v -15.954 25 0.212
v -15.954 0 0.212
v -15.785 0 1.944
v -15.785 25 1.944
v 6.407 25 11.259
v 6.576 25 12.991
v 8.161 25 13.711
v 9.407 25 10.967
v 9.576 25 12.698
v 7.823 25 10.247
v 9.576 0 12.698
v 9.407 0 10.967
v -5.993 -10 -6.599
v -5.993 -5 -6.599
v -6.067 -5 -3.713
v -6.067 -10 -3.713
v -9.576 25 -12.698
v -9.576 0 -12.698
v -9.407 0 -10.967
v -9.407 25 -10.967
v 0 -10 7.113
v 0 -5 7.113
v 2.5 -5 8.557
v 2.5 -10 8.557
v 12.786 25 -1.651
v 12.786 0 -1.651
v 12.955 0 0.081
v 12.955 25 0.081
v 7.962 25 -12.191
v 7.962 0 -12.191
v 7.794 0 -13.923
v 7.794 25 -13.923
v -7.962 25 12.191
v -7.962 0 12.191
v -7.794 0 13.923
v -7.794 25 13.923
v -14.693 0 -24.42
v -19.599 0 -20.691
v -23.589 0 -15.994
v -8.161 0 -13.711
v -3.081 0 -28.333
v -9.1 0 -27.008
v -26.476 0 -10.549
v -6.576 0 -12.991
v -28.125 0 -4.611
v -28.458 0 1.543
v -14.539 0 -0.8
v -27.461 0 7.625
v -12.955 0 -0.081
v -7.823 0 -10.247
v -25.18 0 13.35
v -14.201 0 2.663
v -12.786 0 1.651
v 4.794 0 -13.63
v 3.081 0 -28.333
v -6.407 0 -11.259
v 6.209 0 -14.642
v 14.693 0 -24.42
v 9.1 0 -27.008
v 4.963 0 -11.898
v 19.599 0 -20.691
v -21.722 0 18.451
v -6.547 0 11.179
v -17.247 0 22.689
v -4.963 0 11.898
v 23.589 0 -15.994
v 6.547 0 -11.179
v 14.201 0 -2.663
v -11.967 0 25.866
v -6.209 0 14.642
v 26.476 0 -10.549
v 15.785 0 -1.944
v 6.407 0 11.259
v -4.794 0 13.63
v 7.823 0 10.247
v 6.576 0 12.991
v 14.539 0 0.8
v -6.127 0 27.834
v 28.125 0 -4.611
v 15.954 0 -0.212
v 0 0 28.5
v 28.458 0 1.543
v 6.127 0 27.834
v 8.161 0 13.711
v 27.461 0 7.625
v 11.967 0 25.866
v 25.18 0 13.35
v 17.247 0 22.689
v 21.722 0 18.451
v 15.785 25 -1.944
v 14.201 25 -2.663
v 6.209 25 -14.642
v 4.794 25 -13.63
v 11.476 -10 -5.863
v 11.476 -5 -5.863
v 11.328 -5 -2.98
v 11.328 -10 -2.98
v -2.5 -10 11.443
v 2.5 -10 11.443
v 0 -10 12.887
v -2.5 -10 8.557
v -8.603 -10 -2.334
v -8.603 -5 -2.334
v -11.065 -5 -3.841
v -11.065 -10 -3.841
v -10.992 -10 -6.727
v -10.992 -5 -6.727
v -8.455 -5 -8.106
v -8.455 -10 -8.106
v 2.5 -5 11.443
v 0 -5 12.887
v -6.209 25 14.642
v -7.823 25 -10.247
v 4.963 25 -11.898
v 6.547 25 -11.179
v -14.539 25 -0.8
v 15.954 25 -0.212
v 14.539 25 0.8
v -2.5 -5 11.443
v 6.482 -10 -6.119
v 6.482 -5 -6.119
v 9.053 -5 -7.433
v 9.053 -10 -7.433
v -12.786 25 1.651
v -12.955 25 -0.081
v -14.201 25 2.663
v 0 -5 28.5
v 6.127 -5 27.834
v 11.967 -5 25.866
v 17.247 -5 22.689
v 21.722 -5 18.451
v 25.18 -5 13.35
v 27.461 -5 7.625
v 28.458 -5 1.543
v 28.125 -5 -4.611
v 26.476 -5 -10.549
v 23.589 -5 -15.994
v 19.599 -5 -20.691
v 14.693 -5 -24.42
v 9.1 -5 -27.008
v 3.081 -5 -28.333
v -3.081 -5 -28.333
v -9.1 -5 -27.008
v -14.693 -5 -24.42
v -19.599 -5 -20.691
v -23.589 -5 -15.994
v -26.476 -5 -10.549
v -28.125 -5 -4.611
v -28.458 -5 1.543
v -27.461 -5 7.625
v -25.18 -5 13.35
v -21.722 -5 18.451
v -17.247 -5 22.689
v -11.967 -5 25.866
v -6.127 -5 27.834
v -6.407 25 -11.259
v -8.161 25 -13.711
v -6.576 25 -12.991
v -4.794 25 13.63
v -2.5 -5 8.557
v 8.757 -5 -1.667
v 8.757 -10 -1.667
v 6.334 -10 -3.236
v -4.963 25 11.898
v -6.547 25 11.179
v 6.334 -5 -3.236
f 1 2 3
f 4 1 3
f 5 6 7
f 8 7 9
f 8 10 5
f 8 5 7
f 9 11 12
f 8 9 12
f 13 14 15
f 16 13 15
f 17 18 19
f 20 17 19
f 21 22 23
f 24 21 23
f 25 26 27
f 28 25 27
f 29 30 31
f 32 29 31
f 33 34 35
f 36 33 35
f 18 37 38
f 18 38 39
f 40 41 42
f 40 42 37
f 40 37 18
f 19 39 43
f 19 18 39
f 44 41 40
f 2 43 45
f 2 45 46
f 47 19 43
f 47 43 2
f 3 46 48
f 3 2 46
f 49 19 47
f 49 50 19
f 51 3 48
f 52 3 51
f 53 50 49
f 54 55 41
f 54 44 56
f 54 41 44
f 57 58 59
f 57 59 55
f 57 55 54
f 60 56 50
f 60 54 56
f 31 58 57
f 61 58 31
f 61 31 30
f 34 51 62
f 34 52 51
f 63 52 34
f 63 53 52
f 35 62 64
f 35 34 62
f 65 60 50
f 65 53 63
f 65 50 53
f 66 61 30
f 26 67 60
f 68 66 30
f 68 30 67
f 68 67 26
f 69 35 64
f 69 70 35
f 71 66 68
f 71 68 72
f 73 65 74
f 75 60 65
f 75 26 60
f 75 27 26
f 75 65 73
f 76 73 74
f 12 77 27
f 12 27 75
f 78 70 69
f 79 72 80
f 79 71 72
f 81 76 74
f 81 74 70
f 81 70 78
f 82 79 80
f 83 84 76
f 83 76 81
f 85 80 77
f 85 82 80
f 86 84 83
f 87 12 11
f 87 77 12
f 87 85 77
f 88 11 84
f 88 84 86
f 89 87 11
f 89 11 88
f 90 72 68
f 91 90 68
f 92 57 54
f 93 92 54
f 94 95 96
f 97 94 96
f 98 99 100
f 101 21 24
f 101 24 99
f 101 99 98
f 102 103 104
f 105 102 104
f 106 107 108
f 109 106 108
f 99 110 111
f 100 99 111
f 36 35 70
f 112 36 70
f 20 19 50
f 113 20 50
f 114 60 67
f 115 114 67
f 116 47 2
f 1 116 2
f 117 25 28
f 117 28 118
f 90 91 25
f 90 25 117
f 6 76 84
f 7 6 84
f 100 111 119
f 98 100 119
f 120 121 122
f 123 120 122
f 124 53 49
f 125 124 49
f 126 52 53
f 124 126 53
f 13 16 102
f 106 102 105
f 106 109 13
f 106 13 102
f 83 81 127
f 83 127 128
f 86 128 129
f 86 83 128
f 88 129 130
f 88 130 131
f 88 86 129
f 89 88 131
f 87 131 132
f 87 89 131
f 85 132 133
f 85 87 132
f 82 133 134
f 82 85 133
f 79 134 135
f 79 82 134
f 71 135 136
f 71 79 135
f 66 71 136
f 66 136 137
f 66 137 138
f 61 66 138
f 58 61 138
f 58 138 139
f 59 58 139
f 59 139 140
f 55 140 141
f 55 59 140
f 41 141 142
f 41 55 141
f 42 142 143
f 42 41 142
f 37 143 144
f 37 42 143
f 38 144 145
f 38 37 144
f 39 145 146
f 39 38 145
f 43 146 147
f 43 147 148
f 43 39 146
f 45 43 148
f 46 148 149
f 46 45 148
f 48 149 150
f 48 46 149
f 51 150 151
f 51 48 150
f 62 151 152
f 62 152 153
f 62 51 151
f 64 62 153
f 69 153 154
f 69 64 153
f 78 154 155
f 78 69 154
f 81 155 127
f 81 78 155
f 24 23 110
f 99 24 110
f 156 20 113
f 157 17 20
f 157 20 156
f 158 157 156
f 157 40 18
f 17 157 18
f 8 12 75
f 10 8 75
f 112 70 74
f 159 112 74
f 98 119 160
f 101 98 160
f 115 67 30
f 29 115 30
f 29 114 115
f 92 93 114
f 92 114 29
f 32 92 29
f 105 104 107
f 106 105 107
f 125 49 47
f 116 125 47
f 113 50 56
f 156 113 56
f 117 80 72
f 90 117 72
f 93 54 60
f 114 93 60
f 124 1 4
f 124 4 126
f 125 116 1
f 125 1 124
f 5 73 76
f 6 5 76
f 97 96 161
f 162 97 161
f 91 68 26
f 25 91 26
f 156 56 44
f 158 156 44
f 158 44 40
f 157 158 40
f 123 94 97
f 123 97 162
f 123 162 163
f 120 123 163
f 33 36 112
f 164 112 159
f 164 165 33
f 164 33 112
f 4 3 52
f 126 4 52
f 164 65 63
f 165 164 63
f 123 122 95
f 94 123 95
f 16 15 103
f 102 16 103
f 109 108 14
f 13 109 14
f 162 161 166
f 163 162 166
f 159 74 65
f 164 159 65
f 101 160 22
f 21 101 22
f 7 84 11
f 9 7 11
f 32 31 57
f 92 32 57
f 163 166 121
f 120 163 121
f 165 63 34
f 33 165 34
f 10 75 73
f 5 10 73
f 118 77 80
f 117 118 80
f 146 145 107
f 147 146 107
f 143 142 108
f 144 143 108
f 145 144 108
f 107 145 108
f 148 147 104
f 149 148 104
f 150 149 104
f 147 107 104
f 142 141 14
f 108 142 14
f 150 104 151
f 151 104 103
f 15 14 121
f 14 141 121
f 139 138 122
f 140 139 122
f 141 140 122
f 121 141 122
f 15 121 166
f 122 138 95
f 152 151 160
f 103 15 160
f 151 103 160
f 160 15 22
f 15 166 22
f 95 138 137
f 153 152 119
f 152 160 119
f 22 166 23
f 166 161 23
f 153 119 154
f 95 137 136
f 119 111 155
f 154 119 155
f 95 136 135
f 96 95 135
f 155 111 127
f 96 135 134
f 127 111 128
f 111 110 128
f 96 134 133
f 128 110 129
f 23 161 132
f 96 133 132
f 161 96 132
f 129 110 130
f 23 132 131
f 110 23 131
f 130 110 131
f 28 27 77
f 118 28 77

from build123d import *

# Parameters (mm, degrees)
EXTRUDE_1_DEPTH   = 25
EXTRUDE_1_2_DEPTH = 25
EXTRUDE_1_3_DEPTH = 25
EXTRUDE_1_4_DEPTH = 25
EXTRUDE_1_5_DEPTH = 25
EXTRUDE_1_6_DEPTH = 25
SKETCH_2_R        = 28.5
EXTRUDE_2_DEPTH   = 5
EXTRUDE_4_DEPTH   = 5


with BuildPart() as part:
    # 草图1 → 凸台-拉伸1 (new body)
    with BuildSketch(Plane(origin=(0, 0, 0), x_dir=(1, 0, 0), z_dir=(0, 1, 0))):
        Polygon((4.794019272, 13.629956631), (4.962963937, 11.898177863), (6.547200676, 11.178598851), (7.96249275, 12.190798607), (7.793548085, 13.922577374), (6.209311346, 14.642156386), align=None)
    extrude(amount=EXTRUDE_1_DEPTH)



with BuildPart() as body_2:
    # 草图1 → Extrude 1 2 (new body)
    with BuildSketch(Plane(origin=(0, 0, 0), x_dir=(1, 0, 0), z_dir=(0, 1, 0))):
        Polygon((15.954079735, 0.21187806), (15.78513507, 1.943656828), (14.200898331, 2.66323584), (12.785606257, 1.651036084), (12.954550922, -0.080742684), (14.538787661, -0.800321696), align=None)
    extrude(amount=EXTRUDE_1_2_DEPTH)


with BuildPart() as body_3:
    # 草图1 → Extrude 1 3 (new body)
    with BuildSketch(Plane(origin=(0, 0, 0), x_dir=(1, 0, 0), z_dir=(0, 1, 0))):
        Polygon((8.16053165, -13.710699314), (9.575823724, -12.698499559), (9.406879059, -10.966720791), (7.82264232, -10.247141779), (6.407350246, -11.259341535), (6.576294911, -12.991120302), align=None)
    extrude(amount=EXTRUDE_1_3_DEPTH)


with BuildPart() as body_4:
    # 草图1 → Extrude 1 4 (new body)
    with BuildSketch(Plane(origin=(0, 0, 0), x_dir=(1, 0, 0), z_dir=(0, 1, 0))):
        Polygon((-7.793548085, -13.922577374), (-6.209311346, -14.642156386), (-4.794019272, -13.629956631), (-4.962963937, -11.898177863), (-6.547200676, -11.178598851), (-7.96249275, -12.190798607), align=None)
    extrude(amount=EXTRUDE_1_4_DEPTH)


with BuildPart() as body_5:
    # 草图1 → Extrude 1 5 (new body)
    with BuildSketch(Plane(origin=(0, 0, 0), x_dir=(1, 0, 0), z_dir=(0, 1, 0))):
        Polygon((-12.785606257, -1.651036084), (-12.954550922, 0.080742684), (-14.538787661, 0.800321696), (-15.954079735, -0.21187806), (-15.78513507, -1.943656828), (-14.200898331, -2.66323584), align=None)
    extrude(amount=EXTRUDE_1_5_DEPTH)


with BuildPart() as body_6:
    # 草图1 → Extrude 1 6 (new body)
    with BuildSketch(Plane(origin=(0, 0, 0), x_dir=(1, 0, 0), z_dir=(0, 1, 0))):
        Polygon((-6.576294911, 12.991120302), (-8.16053165, 13.710699314), (-9.575823724, 12.698499559), (-9.406879059, 10.966720791), (-7.82264232, 10.247141779), (-6.407350246, 11.259341535), align=None)
    extrude(amount=EXTRUDE_1_6_DEPTH)


with BuildPart() as part_1:
    add(part.part)

    add(body_2.part)  # 凸台-拉伸2 merges body 2

    add(body_3.part)  # 凸台-拉伸2 merges body 3

    add(body_4.part)  # 凸台-拉伸2 merges body 4

    add(body_5.part)  # 凸台-拉伸2 merges body 5

    add(body_6.part)  # 凸台-拉伸2 merges body 6
    # 草图2 → 凸台-拉伸2 (add)
    with BuildSketch(Plane(origin=(0, 0, 0), x_dir=(1, 0, 0), z_dir=(0, 1, 0))):
        with Locations(Location((0, 0, 0), (0, 0, 270))):
            Circle(SKETCH_2_R)
    extrude(amount=-EXTRUDE_2_DEPTH)

    # 草图3 → 凸台-拉伸4 (add)
    with BuildSketch(Plane(origin=(0, -5, 0), x_dir=(-1, 0, 0), z_dir=(0, -1, 0))):
        Polygon((6.067131278, 3.713249853), (8.603282508, 2.334384279), (11.065490739, 3.841322885), (10.991547739, 6.727127065), (8.455396509, 8.105992639), (5.993188279, 6.599054033), align=None)
        Polygon((0, -7.113248654), (-2.5, -8.556624327), (-2.5, -11.443375673), (0, -12.886751346), (2.5, -11.443375673), (2.5, -8.556624327), align=None)
        Polygon((-6.334313735, 3.236475849), (-6.482151211, 6.119439153), (-9.052789409, 7.432889795), (-11.475590131, 5.863377133), (-11.327752654, 2.980413829), (-8.757114457, 1.666963187), align=None)
    extrude(amount=EXTRUDE_4_DEPTH)


solid = part_1.part
